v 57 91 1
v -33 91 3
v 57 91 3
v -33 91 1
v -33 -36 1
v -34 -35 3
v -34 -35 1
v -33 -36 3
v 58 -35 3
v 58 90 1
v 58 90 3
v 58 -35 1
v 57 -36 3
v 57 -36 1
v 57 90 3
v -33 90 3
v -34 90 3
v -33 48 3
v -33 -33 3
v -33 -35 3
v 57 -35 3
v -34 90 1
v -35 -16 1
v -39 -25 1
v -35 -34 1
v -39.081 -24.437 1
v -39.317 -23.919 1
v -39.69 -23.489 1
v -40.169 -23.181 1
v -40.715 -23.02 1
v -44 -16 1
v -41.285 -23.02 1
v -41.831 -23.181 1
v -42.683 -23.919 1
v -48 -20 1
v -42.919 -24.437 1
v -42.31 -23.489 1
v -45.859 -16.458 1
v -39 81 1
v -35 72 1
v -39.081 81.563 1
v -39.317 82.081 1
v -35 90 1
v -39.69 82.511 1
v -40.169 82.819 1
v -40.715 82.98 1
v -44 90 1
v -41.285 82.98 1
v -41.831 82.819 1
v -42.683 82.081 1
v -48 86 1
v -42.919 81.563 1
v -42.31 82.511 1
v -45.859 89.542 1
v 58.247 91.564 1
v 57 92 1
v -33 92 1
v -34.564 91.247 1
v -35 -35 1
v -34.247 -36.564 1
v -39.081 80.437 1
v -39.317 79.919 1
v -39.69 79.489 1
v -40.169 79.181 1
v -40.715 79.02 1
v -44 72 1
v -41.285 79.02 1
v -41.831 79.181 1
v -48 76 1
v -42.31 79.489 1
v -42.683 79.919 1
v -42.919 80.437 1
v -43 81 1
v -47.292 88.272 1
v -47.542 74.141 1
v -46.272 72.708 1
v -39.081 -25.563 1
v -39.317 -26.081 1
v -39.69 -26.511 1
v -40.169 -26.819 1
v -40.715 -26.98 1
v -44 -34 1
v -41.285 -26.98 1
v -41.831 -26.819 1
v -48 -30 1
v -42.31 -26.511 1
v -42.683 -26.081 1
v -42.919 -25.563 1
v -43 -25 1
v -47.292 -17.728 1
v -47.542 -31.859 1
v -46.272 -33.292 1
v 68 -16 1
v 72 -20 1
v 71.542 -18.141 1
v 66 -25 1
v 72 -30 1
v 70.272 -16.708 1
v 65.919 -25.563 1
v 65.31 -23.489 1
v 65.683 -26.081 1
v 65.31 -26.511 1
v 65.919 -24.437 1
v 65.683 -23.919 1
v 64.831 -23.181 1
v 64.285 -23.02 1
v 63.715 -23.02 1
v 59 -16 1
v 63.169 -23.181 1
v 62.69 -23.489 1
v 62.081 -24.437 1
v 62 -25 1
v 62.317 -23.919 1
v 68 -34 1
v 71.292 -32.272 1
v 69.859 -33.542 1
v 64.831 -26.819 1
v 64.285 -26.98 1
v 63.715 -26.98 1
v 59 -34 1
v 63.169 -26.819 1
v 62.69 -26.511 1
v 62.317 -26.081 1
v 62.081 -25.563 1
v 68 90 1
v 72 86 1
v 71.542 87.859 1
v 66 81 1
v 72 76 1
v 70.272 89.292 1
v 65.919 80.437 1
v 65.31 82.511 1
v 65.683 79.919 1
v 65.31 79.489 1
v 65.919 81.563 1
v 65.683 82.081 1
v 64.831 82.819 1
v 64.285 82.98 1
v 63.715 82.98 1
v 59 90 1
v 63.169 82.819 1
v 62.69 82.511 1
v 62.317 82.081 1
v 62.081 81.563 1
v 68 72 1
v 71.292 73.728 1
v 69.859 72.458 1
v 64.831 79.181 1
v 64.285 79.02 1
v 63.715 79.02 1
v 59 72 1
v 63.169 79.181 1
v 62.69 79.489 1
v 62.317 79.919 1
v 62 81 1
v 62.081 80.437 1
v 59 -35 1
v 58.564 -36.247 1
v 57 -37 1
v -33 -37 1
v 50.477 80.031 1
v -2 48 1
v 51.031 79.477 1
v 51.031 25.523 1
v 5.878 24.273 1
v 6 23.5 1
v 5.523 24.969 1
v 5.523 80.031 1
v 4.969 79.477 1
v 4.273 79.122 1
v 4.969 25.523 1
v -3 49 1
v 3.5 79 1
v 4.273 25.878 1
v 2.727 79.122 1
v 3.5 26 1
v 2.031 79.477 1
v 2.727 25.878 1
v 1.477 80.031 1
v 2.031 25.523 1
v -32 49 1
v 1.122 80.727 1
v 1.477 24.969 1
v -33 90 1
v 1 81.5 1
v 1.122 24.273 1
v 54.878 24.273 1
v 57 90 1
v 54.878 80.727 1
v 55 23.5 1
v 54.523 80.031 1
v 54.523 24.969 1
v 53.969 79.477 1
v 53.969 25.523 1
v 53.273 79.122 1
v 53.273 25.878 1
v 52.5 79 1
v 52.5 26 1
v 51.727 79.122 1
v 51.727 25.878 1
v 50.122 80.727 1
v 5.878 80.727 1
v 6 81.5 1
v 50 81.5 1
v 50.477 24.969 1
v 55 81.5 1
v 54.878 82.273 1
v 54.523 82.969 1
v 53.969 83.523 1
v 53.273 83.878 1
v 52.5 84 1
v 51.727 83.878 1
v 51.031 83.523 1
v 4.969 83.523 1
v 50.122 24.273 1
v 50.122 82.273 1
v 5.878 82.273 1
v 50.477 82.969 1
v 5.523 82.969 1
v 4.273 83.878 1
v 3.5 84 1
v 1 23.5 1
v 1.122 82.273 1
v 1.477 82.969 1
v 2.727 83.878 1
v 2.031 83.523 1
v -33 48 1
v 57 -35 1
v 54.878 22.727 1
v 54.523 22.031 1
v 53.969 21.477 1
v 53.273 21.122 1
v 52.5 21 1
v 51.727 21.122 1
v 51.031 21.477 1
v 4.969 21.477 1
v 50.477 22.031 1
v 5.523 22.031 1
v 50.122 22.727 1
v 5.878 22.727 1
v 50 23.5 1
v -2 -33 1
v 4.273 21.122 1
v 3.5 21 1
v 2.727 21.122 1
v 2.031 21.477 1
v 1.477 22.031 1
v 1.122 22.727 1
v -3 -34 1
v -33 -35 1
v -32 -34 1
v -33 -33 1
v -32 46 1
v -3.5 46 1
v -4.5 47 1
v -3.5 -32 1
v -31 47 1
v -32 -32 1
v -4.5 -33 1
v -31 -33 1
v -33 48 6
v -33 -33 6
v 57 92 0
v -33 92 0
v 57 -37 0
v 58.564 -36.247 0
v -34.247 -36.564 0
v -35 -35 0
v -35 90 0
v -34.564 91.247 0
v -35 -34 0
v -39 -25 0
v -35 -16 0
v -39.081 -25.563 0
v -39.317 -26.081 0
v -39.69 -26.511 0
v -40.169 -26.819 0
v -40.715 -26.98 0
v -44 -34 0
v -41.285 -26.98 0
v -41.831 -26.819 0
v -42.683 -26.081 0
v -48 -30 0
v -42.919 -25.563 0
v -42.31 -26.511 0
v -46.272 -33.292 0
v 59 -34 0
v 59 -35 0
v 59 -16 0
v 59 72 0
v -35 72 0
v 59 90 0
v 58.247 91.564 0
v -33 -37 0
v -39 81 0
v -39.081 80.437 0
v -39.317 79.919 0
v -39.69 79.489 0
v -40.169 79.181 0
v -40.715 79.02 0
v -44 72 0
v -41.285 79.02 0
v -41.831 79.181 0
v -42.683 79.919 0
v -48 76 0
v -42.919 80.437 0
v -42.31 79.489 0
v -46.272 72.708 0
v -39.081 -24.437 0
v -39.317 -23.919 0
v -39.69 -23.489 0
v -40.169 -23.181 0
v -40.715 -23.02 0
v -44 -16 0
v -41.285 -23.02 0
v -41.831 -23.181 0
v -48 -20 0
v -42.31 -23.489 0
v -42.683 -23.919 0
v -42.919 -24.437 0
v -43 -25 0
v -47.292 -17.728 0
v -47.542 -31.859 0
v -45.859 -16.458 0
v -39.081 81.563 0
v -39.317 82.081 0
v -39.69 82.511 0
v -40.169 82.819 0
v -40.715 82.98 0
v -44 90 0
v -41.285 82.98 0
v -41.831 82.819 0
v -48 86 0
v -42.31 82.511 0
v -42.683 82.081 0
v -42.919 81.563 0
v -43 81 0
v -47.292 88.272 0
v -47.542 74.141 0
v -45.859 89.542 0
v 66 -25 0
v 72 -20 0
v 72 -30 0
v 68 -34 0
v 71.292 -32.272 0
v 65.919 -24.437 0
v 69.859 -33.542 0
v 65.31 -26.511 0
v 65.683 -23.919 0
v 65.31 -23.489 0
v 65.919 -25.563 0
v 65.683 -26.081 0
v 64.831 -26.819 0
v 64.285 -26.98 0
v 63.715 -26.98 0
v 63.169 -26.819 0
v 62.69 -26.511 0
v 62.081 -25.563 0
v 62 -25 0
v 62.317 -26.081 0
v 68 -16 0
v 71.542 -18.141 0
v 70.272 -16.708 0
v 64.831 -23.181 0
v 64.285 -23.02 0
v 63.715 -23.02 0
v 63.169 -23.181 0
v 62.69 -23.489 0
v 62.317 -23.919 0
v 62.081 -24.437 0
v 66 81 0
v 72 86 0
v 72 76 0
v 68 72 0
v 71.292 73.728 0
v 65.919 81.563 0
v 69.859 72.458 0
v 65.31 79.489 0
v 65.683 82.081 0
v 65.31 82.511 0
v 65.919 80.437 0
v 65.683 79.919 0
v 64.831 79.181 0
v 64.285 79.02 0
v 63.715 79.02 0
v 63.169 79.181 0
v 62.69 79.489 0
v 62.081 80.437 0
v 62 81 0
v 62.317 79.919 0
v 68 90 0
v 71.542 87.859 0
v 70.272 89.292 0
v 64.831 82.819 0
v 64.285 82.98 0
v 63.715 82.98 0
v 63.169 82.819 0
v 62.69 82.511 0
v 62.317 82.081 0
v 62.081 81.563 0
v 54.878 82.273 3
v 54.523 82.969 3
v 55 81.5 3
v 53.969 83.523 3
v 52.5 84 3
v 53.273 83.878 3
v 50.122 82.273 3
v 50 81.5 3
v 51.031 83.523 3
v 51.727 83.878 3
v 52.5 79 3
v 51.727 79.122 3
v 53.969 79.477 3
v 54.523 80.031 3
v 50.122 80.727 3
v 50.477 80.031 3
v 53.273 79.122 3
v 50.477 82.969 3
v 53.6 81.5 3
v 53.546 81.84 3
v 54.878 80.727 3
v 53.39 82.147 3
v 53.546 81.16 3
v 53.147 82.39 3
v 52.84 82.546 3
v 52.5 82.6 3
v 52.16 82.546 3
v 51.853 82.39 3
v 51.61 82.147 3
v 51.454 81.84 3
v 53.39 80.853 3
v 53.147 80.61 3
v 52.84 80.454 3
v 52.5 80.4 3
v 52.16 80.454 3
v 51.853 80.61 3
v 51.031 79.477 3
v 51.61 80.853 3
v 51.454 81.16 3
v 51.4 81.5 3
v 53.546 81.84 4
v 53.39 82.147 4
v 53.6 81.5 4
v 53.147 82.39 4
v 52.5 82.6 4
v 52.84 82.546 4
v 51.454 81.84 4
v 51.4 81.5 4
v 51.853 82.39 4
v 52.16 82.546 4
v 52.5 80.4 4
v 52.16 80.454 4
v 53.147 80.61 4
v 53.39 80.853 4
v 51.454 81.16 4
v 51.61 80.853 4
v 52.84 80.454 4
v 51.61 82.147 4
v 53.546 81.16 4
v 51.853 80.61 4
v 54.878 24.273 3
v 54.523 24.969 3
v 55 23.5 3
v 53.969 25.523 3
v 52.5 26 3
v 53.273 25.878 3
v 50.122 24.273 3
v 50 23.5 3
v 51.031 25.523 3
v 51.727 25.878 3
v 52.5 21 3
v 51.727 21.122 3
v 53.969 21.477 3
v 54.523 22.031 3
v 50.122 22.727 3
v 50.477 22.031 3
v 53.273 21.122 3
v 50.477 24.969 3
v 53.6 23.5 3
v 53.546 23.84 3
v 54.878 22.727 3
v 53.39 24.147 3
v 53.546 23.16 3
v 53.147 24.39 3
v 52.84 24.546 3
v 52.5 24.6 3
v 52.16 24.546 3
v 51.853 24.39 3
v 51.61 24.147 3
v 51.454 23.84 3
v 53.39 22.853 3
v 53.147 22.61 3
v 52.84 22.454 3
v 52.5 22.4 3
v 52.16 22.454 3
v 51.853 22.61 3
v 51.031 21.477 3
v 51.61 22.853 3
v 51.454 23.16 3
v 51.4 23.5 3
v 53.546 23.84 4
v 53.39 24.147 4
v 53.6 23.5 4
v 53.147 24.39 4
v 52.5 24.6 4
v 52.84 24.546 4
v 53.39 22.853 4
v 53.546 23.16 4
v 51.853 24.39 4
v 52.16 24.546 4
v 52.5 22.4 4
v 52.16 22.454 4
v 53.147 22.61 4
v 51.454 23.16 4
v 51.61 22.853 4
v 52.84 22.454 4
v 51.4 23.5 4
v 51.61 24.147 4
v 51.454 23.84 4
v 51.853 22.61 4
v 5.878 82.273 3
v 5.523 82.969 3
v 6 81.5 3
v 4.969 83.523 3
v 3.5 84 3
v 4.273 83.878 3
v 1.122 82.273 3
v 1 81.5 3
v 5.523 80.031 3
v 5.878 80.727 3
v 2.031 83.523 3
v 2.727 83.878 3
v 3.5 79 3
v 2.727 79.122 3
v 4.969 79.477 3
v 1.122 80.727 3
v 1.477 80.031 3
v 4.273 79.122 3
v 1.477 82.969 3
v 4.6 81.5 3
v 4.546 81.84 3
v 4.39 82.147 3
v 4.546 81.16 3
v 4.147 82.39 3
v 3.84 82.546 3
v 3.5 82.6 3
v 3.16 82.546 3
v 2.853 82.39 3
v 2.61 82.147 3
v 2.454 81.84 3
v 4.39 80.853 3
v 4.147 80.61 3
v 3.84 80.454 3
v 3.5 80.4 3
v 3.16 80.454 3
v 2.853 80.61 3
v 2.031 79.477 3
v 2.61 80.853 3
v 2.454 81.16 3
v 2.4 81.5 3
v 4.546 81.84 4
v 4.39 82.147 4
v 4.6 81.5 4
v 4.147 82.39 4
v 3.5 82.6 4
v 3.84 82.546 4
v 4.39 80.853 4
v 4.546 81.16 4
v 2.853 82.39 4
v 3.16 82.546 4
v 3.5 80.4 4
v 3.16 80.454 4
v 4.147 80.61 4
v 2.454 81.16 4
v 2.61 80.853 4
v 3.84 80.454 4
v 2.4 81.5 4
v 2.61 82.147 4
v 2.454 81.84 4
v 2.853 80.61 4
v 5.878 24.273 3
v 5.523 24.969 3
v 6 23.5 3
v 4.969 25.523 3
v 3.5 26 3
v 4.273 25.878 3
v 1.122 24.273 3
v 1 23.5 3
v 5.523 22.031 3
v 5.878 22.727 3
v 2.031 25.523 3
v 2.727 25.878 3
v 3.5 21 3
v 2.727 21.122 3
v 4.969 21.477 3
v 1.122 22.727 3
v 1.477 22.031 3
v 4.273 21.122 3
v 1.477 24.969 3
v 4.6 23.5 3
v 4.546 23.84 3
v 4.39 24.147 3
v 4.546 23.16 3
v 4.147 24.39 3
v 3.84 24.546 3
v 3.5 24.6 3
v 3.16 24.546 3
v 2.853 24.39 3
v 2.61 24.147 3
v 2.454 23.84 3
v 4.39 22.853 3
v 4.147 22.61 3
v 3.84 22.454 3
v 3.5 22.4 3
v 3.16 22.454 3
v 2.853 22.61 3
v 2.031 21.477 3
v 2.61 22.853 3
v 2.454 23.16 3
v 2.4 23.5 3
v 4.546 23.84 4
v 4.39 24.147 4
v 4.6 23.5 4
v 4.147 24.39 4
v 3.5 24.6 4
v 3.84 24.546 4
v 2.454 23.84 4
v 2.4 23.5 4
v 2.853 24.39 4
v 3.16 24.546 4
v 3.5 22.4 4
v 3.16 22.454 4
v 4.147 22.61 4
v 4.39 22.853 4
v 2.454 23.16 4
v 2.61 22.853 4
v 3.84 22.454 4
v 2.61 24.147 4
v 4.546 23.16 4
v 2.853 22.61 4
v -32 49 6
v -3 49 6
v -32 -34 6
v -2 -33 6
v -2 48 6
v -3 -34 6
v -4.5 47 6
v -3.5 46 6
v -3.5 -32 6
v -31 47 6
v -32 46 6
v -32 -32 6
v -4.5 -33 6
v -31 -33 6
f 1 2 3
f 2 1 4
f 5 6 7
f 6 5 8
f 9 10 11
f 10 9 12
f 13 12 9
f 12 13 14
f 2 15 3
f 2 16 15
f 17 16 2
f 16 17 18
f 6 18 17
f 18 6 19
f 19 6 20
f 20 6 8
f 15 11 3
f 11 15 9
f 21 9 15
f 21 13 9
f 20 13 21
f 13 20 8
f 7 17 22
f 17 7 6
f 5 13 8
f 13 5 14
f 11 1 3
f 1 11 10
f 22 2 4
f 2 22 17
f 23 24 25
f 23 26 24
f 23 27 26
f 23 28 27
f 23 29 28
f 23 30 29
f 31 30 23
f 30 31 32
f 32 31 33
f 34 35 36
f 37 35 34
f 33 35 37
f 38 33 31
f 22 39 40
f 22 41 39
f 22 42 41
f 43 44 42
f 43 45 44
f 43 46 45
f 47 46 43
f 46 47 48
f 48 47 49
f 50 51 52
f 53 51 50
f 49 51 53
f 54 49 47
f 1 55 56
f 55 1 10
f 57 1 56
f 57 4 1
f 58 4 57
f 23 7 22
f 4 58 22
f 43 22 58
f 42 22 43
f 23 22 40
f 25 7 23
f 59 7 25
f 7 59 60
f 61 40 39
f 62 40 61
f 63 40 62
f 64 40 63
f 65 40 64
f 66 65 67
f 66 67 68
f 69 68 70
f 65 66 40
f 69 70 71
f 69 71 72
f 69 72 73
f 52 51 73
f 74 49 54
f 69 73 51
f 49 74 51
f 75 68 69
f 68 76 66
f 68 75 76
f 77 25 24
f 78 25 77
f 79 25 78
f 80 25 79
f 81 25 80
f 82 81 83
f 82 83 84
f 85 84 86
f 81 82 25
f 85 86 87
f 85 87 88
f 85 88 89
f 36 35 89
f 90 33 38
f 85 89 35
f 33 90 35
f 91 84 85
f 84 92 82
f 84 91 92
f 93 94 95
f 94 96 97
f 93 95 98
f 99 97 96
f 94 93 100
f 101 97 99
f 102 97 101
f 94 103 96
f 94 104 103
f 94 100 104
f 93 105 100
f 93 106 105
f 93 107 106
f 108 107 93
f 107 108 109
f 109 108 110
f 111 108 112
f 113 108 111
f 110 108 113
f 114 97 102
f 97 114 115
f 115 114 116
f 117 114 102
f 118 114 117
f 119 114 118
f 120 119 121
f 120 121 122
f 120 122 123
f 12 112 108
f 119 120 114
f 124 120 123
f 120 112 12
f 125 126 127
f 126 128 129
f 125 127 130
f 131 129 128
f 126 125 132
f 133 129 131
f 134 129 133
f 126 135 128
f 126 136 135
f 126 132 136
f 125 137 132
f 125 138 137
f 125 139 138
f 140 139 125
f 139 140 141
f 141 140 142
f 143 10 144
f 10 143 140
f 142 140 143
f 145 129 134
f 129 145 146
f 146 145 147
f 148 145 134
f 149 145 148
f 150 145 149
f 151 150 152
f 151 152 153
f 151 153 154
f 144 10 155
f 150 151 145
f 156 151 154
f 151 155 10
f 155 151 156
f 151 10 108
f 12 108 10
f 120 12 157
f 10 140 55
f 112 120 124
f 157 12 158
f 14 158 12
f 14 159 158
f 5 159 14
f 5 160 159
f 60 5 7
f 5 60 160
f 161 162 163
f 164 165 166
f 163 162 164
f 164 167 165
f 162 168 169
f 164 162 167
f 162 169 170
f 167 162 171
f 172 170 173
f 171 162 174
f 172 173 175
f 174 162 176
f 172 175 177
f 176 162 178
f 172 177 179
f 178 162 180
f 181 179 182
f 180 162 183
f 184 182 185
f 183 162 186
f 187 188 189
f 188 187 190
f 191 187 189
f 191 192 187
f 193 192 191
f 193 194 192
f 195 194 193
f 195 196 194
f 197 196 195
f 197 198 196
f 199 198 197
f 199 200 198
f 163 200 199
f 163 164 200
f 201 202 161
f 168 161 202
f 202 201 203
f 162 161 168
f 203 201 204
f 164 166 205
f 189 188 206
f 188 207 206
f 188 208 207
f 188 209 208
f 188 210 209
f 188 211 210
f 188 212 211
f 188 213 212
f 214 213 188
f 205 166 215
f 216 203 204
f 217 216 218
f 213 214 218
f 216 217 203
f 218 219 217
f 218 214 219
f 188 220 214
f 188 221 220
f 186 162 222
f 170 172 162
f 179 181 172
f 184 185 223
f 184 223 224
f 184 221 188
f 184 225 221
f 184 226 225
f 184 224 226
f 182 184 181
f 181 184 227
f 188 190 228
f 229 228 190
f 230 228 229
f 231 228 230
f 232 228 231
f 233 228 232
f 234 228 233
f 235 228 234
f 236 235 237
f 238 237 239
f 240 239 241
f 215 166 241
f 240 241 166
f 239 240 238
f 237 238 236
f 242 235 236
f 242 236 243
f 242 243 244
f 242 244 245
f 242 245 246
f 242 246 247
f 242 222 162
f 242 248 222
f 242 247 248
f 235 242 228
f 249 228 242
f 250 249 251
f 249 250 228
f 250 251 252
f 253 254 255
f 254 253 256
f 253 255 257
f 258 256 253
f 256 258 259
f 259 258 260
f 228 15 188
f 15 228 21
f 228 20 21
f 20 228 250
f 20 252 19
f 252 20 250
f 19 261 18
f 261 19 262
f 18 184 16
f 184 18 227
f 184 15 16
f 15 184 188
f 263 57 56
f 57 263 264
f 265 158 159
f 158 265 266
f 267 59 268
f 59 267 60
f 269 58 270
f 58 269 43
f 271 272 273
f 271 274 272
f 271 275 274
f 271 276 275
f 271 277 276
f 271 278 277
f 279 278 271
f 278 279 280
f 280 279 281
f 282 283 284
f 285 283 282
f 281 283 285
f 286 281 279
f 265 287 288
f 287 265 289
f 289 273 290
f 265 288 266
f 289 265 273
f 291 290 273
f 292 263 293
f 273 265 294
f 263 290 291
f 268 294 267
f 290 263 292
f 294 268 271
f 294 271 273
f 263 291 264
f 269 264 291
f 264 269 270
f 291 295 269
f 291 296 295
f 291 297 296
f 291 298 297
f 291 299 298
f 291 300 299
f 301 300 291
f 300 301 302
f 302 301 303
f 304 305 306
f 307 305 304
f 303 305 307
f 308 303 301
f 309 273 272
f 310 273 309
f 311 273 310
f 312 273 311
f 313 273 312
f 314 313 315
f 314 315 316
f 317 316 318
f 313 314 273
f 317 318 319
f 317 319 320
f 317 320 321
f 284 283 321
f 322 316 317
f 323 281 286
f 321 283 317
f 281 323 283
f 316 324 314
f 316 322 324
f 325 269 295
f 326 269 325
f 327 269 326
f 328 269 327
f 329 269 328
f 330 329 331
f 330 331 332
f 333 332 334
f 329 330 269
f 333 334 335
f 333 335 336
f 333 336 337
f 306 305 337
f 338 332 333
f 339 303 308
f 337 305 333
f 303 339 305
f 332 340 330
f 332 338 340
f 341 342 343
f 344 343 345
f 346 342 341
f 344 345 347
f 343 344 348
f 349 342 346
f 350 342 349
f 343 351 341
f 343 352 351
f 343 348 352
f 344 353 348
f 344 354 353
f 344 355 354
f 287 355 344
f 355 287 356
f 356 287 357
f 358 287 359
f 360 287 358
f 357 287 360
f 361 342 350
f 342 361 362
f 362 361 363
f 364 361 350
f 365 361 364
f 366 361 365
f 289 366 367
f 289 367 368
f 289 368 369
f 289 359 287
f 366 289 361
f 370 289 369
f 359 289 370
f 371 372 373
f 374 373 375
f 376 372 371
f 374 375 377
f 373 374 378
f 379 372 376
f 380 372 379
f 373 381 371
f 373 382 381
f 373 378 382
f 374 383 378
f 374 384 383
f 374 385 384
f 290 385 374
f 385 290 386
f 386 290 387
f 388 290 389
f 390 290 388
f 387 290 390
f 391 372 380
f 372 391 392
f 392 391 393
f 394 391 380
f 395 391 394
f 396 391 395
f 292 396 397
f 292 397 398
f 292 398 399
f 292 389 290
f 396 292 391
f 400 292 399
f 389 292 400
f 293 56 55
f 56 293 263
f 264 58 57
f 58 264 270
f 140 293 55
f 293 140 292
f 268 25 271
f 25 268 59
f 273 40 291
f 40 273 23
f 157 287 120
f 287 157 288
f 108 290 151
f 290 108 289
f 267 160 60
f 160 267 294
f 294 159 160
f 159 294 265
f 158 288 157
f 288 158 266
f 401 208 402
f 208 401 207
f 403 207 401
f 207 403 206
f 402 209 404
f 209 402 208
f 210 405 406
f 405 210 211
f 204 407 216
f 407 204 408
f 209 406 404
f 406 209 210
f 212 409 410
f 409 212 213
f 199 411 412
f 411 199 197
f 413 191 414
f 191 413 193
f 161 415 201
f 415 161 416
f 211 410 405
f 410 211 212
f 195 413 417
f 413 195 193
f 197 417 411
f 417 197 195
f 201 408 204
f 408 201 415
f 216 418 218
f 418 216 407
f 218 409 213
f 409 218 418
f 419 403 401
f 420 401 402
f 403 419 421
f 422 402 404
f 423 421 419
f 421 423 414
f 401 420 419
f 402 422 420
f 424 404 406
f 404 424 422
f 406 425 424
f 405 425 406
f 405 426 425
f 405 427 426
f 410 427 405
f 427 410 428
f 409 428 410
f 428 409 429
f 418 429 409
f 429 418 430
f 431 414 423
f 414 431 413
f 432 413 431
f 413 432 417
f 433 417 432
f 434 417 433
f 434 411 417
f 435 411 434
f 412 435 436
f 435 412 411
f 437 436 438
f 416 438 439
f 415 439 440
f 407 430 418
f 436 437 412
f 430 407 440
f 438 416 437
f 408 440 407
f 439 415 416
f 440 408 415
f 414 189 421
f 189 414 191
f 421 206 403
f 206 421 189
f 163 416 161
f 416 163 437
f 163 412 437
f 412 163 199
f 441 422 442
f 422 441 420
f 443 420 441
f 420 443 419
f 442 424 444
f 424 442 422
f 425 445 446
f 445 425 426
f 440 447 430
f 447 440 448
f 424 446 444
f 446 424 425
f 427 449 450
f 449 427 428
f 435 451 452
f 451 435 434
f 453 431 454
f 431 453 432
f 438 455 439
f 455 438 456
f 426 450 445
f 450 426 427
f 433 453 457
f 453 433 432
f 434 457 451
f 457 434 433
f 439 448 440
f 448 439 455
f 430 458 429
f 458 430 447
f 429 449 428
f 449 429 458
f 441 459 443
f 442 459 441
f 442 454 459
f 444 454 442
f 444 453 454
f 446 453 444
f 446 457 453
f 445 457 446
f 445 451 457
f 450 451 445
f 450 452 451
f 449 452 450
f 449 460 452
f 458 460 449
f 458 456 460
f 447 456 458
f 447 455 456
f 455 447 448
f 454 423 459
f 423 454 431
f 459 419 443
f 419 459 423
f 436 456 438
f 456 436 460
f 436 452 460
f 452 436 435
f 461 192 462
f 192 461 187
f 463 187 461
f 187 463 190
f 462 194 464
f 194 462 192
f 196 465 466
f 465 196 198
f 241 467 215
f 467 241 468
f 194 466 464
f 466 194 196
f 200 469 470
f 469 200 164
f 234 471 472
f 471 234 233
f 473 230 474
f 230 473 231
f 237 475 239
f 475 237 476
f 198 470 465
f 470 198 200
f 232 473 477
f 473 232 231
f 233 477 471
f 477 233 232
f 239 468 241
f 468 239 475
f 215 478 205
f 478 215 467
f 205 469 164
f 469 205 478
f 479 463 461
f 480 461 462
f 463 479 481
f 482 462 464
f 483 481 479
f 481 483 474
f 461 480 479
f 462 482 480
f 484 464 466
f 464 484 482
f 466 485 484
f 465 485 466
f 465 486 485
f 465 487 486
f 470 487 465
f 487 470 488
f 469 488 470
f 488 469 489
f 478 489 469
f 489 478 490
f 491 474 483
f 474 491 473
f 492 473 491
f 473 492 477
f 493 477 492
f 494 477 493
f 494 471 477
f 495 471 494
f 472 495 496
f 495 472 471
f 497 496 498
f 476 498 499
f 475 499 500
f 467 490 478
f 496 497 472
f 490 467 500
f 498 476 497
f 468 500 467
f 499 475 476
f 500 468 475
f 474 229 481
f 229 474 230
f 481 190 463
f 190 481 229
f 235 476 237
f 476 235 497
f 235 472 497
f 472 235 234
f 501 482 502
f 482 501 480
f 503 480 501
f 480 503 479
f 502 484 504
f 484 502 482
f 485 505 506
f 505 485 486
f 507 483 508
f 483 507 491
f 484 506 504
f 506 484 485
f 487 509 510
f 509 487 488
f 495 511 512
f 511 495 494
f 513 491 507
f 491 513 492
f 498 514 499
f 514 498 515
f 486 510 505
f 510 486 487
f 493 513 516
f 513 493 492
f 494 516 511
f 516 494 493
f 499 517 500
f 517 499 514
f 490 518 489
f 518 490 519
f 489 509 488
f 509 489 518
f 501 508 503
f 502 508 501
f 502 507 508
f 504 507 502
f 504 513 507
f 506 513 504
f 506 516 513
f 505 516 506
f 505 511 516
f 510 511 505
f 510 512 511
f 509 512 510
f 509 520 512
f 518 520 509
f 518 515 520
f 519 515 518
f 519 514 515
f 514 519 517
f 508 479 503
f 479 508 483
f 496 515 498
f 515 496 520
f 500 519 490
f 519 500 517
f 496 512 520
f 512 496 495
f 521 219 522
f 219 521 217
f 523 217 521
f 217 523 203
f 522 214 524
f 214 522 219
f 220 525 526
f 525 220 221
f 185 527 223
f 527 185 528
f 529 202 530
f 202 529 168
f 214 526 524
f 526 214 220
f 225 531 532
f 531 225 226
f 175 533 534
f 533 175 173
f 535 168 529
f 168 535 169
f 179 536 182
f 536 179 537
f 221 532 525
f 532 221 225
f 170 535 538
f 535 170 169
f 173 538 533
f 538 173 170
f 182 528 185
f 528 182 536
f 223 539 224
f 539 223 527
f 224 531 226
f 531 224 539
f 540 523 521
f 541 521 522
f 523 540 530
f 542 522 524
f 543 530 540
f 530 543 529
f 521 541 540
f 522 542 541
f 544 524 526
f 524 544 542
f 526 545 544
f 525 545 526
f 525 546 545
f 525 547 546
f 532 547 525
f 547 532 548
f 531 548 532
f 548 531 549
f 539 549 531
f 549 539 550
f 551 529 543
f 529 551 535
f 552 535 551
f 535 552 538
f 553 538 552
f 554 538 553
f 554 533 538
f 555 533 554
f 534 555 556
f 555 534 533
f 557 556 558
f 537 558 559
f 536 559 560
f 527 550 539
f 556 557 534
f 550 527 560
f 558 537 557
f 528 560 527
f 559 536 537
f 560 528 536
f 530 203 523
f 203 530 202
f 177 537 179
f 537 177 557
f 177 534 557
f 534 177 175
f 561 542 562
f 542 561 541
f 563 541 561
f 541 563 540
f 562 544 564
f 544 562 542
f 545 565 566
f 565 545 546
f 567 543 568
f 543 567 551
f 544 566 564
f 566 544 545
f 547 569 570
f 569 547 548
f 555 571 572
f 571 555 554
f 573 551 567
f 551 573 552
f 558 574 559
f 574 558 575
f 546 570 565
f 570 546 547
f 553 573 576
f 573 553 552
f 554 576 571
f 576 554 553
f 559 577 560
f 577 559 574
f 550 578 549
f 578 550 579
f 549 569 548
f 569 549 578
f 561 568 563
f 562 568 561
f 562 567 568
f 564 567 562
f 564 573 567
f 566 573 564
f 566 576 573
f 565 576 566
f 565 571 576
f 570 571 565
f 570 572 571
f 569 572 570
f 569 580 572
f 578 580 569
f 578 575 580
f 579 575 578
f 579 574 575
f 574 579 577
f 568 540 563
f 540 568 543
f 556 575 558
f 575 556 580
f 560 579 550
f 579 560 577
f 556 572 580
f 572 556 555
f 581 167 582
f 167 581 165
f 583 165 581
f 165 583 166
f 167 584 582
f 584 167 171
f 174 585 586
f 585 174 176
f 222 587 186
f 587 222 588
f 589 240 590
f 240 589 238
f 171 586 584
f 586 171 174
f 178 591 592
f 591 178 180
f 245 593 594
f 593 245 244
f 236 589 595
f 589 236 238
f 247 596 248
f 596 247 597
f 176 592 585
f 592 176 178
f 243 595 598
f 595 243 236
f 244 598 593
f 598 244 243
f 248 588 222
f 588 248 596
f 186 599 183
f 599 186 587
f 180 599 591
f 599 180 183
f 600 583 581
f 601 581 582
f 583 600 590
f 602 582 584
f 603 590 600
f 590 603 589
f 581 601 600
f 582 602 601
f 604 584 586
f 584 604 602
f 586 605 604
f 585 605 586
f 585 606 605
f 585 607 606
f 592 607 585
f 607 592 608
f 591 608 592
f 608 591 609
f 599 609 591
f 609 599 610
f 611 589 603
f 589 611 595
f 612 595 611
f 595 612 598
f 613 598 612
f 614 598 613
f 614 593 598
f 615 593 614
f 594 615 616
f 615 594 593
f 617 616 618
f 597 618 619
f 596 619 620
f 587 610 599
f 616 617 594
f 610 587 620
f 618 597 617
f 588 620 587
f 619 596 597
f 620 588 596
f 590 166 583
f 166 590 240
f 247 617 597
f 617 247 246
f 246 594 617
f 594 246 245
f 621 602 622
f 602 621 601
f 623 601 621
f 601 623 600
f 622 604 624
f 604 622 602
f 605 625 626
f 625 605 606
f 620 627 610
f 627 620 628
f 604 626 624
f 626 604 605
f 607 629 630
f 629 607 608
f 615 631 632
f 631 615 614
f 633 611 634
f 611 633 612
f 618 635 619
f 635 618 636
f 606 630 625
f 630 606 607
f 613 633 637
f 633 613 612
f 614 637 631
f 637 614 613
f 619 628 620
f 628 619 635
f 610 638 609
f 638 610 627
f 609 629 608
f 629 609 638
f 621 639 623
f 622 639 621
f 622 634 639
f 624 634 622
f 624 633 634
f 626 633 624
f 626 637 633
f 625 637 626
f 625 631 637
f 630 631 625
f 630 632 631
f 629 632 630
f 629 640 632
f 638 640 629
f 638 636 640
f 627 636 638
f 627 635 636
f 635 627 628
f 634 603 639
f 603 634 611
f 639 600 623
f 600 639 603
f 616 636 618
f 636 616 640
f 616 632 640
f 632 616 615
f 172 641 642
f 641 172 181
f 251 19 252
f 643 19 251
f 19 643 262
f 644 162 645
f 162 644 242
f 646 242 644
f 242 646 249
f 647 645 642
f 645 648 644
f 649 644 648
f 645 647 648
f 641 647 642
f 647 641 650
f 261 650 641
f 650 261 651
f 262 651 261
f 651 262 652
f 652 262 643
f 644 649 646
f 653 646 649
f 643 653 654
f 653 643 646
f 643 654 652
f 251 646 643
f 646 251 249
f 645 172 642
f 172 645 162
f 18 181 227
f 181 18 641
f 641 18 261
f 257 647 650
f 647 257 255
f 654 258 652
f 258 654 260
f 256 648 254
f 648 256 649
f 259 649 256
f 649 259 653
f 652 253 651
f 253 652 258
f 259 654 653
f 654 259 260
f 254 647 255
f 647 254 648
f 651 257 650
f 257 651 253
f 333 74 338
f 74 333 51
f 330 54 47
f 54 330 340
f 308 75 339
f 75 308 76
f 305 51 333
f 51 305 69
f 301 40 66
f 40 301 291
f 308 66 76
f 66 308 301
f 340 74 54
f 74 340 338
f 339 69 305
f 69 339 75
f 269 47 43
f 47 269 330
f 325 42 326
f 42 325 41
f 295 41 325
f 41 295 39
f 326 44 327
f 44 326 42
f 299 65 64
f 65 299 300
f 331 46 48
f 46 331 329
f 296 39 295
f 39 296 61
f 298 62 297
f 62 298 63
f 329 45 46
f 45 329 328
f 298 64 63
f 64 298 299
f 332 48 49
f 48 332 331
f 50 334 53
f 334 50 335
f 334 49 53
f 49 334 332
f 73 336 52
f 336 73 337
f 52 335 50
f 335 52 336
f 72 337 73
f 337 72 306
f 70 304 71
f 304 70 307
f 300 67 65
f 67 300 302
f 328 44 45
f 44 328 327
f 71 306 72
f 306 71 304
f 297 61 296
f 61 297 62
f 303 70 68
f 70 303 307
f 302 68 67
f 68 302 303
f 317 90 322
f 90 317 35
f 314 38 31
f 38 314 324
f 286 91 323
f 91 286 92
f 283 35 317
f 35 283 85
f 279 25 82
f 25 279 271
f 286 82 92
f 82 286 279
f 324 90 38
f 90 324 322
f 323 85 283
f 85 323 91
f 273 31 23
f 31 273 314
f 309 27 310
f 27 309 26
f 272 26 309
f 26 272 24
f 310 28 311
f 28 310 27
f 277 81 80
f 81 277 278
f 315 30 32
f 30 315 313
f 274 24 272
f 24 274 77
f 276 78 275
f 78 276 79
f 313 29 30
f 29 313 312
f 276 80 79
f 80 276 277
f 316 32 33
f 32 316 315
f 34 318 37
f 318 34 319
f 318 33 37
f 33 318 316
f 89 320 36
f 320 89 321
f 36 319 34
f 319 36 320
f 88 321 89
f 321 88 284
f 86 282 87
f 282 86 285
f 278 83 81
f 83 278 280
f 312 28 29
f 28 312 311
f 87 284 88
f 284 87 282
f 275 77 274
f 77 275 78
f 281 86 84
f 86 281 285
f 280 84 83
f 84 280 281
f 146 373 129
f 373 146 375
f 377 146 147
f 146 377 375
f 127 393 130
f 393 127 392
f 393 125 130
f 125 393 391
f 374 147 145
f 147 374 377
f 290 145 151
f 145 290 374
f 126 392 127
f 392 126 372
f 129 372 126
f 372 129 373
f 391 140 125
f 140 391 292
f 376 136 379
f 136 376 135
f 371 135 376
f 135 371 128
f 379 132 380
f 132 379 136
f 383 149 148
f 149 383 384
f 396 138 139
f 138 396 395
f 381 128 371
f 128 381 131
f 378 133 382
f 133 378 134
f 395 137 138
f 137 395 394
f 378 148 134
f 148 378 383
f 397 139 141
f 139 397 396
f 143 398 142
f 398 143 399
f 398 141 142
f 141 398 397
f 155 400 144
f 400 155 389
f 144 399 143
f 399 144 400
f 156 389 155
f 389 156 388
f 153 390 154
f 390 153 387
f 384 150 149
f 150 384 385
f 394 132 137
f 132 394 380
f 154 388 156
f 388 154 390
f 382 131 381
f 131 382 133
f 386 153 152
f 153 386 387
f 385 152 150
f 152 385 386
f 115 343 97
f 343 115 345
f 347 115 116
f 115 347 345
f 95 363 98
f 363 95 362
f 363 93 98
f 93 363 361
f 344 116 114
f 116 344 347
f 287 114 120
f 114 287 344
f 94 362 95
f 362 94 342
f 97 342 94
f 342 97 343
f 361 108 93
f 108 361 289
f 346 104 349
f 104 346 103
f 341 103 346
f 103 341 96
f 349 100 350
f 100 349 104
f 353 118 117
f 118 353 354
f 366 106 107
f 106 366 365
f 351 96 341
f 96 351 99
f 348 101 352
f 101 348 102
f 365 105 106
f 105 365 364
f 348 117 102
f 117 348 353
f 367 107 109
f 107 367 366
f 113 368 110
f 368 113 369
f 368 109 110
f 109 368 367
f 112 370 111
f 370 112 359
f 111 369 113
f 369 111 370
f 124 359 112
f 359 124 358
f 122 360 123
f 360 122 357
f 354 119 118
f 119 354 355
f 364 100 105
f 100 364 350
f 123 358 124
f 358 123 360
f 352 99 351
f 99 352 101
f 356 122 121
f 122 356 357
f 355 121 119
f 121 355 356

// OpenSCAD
// Mbox1a.scad
// This is the box base

// baseplate with a lip 1mm all around
translate([-33,-35,0]){
linear_extrude(height=1)
offset(r=2)
square([90,125]);
        
difference(){    
    translate([0,0,1])    
    linear_extrude(height=2)
    offset(r=1)
    square([90,125]);    

    translate([0,0,1])    
    linear_extrude(height=3)
    offset(r=0)
    square([90,125]);    
    }
}   // end of translate for base    
    
// posts for the pi
translate([52.5,81.5,1]){
    cylinder(r=2.5,h=2,$fn=20);
    cylinder(r=1.1,h=3,$fn=20);
}    
translate([52.5,23.5,1]){
    cylinder(r=2.5,h=2,$fn=20);
    cylinder(r=1.1,h=3,$fn=20);
}    
translate([3.5,81.5,1]){
    cylinder(r=2.5,h=2,$fn=20);
    cylinder(r=1.1,h=3,$fn=20);
}    
translate([3.5,23.5,1]){
    cylinder(r=2.5,h=2,$fn=20);
    cylinder(r=1.1,h=3,$fn=20);
}    
      
// boss for PoE
difference(){
    color("pink")
    translate([-32,-33,1])
    linear_extrude(height=5)
    offset(r=1)
    square([29,81]);

    color("cyan")
    translate([-31,-32,1])
    linear_extrude(height=6)
    offset(r=1)
    square([26.5,78]);
}

// mounting ears

color("green")
translate([-44,76,0])    {
    difference(){
        linear_extrude(height=1)
        offset(r=4)
        square([10,10]);    
        
        translate([3,5,-1])
        cylinder(r=2,h=3,$fn=22);
    }
}

translate([-44,-30,0])    {
    difference(){
        linear_extrude(height=1)
        offset(r=4)
        square([10,10]);    
        
        translate([3,5,-1])
        cylinder(r=2,h=3,$fn=22);
    }
}

translate([58,76,0])    {
    difference(){
        linear_extrude(height=1)
        offset(r=4)
        square([10,10]);    
        
        translate([6,5,-1])
        cylinder(r=2,h=3,$fn=22);
    }
}

translate([58,-30,0])    {
    difference(){
        linear_extrude(height=1)
        offset(r=4)
        square([10,10]);    
        
        translate([6,5,-1])
        cylinder(r=2,h=3,$fn=22);
    }
}
